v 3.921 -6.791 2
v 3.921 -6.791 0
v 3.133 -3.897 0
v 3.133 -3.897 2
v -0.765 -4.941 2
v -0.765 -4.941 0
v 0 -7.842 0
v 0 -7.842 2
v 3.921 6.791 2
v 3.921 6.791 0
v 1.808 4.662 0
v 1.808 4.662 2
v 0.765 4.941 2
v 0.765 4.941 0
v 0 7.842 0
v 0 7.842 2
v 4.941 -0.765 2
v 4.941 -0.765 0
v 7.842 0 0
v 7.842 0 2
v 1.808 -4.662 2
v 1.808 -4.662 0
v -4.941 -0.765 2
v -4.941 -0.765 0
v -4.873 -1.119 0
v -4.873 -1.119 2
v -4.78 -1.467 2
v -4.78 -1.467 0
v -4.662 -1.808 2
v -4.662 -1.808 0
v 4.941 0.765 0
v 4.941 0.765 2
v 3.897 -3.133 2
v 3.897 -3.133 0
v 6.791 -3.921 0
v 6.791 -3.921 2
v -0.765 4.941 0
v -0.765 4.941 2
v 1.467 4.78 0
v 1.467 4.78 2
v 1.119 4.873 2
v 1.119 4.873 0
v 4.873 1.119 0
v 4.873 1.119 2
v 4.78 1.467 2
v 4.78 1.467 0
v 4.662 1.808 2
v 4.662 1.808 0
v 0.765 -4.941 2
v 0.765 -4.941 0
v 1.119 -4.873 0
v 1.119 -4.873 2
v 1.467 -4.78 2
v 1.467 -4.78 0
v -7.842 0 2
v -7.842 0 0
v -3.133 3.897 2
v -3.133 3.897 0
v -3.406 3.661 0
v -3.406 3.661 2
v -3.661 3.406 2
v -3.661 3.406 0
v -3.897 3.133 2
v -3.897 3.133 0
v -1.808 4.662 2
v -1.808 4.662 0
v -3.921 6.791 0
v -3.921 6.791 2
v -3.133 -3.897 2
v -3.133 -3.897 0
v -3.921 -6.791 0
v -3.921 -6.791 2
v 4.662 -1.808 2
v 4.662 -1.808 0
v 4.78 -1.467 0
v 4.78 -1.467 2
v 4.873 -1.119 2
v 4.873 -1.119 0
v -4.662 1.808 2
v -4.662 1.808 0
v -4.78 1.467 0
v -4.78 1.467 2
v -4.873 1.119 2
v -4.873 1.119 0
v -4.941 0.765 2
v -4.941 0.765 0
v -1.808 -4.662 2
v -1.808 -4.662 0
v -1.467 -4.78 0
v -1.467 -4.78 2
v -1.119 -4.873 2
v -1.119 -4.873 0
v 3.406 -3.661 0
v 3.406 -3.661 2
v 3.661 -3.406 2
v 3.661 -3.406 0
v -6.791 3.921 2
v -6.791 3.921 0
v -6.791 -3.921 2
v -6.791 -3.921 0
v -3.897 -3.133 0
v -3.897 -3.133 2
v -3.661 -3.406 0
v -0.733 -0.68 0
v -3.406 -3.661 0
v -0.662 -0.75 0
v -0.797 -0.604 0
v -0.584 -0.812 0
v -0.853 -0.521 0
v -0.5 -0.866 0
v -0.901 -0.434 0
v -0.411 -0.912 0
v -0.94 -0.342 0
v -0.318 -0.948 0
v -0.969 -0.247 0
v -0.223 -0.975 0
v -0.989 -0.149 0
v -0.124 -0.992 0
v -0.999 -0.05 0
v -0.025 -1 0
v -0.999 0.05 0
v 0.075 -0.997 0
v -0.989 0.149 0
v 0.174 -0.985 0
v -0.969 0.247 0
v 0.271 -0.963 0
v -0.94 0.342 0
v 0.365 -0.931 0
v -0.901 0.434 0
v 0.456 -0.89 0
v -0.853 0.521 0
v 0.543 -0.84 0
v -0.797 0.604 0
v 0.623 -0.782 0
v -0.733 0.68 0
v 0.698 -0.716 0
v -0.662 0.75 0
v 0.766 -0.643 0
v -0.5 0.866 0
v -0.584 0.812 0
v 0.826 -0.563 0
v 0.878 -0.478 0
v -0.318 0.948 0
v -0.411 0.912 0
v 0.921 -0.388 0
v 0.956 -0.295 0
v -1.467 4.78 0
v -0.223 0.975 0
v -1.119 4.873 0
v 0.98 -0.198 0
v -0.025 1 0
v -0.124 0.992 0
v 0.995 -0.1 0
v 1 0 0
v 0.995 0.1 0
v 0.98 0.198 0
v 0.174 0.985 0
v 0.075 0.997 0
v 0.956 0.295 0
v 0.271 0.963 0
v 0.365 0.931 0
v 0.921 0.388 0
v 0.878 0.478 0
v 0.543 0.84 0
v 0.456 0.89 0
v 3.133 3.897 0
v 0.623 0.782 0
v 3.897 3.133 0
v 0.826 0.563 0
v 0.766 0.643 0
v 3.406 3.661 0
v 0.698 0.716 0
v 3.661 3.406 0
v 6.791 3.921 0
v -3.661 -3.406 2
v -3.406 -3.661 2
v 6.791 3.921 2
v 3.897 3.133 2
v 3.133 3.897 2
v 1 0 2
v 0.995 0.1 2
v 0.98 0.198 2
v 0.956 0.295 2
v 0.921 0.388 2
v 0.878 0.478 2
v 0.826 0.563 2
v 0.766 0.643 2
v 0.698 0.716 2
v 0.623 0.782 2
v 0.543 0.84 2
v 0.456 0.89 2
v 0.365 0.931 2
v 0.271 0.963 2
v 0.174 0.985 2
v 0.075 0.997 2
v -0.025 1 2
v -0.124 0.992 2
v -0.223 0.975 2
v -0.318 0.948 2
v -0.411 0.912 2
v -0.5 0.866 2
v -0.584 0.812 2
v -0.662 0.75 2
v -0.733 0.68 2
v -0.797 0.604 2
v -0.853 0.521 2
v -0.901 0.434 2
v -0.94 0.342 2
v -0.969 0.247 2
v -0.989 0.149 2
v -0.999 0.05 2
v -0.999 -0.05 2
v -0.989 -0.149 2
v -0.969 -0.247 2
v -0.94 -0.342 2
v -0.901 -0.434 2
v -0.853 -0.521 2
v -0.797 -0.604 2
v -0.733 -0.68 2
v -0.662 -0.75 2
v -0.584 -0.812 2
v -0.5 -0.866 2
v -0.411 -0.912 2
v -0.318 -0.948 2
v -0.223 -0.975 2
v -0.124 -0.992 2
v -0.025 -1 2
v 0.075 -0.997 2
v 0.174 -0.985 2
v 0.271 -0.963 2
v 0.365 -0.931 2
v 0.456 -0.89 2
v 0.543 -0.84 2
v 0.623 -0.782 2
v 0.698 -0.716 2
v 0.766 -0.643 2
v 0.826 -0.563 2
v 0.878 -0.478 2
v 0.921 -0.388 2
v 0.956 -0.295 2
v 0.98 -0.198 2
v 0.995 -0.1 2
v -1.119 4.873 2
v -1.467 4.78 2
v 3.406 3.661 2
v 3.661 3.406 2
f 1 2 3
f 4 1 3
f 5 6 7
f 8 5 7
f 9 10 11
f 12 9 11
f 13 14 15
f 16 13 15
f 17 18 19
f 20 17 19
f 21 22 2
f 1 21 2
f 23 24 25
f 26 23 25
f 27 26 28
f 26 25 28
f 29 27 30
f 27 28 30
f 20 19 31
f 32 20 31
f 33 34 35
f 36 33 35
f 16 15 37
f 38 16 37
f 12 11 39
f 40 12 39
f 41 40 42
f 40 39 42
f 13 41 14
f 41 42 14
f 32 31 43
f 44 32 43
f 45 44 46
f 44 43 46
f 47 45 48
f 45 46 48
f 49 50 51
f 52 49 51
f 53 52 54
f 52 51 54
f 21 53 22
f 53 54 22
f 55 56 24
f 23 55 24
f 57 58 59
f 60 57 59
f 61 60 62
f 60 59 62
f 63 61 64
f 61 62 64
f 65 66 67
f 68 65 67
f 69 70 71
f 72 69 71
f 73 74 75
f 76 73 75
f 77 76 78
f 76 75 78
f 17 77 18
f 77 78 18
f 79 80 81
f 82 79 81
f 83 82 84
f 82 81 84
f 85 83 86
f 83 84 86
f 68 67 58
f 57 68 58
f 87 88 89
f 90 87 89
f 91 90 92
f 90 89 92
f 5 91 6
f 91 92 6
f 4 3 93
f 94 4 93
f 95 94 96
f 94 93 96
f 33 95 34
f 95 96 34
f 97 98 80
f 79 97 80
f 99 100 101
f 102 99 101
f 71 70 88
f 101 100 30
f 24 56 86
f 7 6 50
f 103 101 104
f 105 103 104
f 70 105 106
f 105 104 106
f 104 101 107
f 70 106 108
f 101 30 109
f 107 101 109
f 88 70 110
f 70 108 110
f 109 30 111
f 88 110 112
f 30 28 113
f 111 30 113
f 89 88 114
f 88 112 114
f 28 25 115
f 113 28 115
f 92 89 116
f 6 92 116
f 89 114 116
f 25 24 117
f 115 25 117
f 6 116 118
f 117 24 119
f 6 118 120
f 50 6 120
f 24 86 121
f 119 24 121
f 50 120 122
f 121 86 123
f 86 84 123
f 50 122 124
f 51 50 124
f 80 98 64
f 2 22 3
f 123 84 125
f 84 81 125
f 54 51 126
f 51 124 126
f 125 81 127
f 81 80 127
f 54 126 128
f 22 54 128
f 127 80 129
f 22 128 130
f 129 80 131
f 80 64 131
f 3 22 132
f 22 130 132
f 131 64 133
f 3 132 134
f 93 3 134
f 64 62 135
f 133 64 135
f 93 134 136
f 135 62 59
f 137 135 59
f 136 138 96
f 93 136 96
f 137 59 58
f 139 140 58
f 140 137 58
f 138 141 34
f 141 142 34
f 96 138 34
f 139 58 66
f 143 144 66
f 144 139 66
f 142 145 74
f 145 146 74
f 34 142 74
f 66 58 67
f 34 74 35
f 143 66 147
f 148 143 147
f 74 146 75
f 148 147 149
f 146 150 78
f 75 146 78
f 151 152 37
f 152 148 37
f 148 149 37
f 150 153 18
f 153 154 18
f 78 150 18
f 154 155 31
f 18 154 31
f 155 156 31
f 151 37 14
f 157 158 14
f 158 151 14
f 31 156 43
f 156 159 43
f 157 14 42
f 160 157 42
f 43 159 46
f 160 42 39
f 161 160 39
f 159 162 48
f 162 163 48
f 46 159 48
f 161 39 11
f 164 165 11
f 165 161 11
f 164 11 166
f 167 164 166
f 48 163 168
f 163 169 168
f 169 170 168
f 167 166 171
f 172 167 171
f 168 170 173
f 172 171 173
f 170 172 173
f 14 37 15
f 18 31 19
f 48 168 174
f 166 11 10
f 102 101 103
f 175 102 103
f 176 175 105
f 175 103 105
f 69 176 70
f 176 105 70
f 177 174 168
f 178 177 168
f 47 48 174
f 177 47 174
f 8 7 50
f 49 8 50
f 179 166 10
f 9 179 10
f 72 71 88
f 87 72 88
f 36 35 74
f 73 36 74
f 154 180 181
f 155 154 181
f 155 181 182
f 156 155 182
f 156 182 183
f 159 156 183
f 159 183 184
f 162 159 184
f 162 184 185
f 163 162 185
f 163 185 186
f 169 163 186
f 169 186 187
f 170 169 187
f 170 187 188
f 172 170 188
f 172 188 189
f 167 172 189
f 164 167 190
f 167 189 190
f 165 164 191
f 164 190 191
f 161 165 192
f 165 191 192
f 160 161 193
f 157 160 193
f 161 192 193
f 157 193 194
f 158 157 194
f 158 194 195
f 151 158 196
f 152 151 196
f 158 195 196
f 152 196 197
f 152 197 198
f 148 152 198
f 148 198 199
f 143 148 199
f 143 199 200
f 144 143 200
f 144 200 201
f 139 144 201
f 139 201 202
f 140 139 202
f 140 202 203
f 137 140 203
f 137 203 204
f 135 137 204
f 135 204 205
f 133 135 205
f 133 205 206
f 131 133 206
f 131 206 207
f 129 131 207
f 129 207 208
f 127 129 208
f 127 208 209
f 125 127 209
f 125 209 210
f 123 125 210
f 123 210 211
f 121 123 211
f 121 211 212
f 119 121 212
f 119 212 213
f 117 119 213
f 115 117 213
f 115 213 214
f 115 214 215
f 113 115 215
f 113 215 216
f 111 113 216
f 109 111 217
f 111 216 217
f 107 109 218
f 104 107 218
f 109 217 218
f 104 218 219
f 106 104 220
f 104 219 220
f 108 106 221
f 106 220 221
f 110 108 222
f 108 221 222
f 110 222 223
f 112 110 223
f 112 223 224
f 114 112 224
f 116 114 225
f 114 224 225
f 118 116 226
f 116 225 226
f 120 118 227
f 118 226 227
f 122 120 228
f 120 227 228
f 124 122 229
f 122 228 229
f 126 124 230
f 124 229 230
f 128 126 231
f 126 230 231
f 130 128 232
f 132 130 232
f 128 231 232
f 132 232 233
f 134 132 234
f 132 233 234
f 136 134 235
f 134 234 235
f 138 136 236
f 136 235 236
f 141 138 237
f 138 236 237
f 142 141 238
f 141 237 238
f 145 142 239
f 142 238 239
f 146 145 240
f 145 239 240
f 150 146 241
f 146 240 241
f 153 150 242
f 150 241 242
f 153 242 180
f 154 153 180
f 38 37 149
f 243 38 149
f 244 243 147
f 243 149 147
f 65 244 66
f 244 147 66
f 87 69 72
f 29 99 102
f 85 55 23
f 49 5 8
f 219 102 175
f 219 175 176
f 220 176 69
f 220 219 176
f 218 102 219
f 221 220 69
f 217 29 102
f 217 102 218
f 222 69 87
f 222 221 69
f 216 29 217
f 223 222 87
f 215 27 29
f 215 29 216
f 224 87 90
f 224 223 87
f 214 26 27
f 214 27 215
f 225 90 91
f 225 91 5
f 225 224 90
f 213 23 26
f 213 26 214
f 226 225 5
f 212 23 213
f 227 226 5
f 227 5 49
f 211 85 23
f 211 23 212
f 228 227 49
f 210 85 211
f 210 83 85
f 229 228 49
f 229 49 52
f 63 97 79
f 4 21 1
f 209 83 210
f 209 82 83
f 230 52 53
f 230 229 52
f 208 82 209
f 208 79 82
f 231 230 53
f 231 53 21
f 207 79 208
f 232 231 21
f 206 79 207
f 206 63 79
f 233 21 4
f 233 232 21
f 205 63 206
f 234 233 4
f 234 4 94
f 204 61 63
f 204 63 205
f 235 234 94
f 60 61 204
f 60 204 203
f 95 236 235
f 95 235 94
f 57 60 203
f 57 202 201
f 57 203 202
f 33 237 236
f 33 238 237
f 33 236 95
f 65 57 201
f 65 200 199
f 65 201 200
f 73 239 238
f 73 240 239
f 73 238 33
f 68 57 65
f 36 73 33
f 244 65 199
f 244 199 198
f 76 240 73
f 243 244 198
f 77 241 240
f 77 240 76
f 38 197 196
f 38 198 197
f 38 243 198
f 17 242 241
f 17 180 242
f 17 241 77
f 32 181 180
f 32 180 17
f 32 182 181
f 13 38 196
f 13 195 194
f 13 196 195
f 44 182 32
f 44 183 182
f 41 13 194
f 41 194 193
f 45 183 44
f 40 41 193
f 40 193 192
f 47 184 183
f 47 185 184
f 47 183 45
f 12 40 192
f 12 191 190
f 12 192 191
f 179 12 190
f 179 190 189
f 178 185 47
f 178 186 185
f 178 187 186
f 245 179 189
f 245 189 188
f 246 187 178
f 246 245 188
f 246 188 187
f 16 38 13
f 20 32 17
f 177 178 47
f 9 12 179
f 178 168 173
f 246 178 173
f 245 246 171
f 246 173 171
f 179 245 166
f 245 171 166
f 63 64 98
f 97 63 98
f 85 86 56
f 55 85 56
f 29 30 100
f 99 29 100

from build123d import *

# Parameters (mm, degrees)
F1_DEPTH = 2
F2_R     = 1
F3_DEPTH = 25


with BuildPart() as f1:
    # F0 (on Top) → F1 (new body)
    with BuildSketch(Plane.XY):
        with BuildLine():
            ThreePointArc((4.941112, -0.76512), (4.985256, -0.383692), (5, 0))
            ThreePointArc((5, 0), (4.985256, 0.383692), (4.941112, 0.76512))
            ThreePointArc((4.941112, 0.76512), (4.829629, 1.294095), (4.661689, 1.807943))
            ThreePointArc((4.661689, 1.807943), (4.330127, 2.5), (3.896569, 3.13317))
            ThreePointArc((3.896569, 3.13317), (3.535534, 3.535534), (3.13317, 3.896569))
            ThreePointArc((3.13317, 3.896569), (2.5, 4.330127), (1.807943, 4.661689))
            ThreePointArc((1.807943, 4.661689), (1.294095, 4.829629), (0.76512, 4.941112))
            ThreePointArc((0.76512, 4.941112), (0, 5), (-0.76512, 4.941112))
            ThreePointArc((-0.76512, 4.941112), (-1.294095, 4.829629), (-1.807943, 4.661689))
            ThreePointArc((-1.807943, 4.661689), (-2.5, 4.330127), (-3.13317, 3.896569))
            ThreePointArc((-3.13317, 3.896569), (-3.535534, 3.535534), (-3.896569, 3.13317))
            ThreePointArc((-3.896569, 3.13317), (-4.330127, 2.5), (-4.661689, 1.807943))
            ThreePointArc((-4.661689, 1.807943), (-4.829629, 1.294095), (-4.941112, 0.76512))
            ThreePointArc((-4.941112, 0.76512), (-5, 0), (-4.941112, -0.76512))
            ThreePointArc((-4.941112, -0.76512), (-4.829629, -1.294095), (-4.661689, -1.807943))
            ThreePointArc((-4.661689, -1.807943), (-4.330127, -2.5), (-3.896569, -3.13317))
            ThreePointArc((-3.896569, -3.13317), (-3.535534, -3.535534), (-3.13317, -3.896569))
            ThreePointArc((-3.13317, -3.896569), (-2.5, -4.330127), (-1.807943, -4.661689))
            ThreePointArc((-1.807943, -4.661689), (-1.294095, -4.829629), (-0.76512, -4.941112))
            ThreePointArc((-0.76512, -4.941112), (0, -5), (0.76512, -4.941112))
            ThreePointArc((0.76512, -4.941112), (1.294095, -4.829629), (1.807943, -4.661689))
            ThreePointArc((1.807943, -4.661689), (2.5, -4.330127), (3.13317, -3.896569))
            ThreePointArc((3.13317, -3.896569), (3.535534, -3.535534), (3.896569, -3.13317))
            ThreePointArc((3.896569, -3.13317), (4.330127, -2.5), (4.661689, -1.807943))
            ThreePointArc((4.661689, -1.807943), (4.829629, -1.294095), (4.941112, -0.76512))
        make_face()
        with BuildLine():
            ThreePointArc((4.941112, 0.76512), (4.985256, 0.383692), (5, 0))
            ThreePointArc((5, 0), (4.985256, -0.383692), (4.941112, -0.76512))
            Line((4.941112, -0.76512), (7.841904, 0))
            Line((7.841904, 0), (4.941112, 0.76512))
        make_face()
        with BuildLine():
            ThreePointArc((3.896569, 3.13317), (4.330127, 2.5), (4.661689, 1.807943))
            Line((4.661689, 1.807943), (6.791288, 3.920952))
            Line((6.791288, 3.920952), (3.896569, 3.13317))
        make_face()
        with BuildLine():
            Line((6.791288, -3.920952), (4.661689, -1.807943))
            ThreePointArc((4.661689, -1.807943), (4.330127, -2.5), (3.896569, -3.13317))
            Line((3.896569, -3.13317), (6.791288, -3.920952))
        make_face()
        with BuildLine():
            ThreePointArc((1.807943, 4.661689), (2.5, 4.330127), (3.13317, 3.896569))
            Line((3.13317, 3.896569), (3.920952, 6.791288))
            Line((3.920952, 6.791288), (1.807943, 4.661689))
        make_face()
        with BuildLine():
            Line((3.920952, -6.791288), (3.13317, -3.896569))
            ThreePointArc((3.13317, -3.896569), (2.5, -4.330127), (1.807943, -4.661689))
            Line((1.807943, -4.661689), (3.920952, -6.791288))
        make_face()
        with BuildLine():
            ThreePointArc((-0.76512, 4.941112), (0, 5), (0.76512, 4.941112))
            Line((0.76512, 4.941112), (0, 7.841904))
            Line((0, 7.841904), (-0.76512, 4.941112))
        make_face()
        with BuildLine():
            Line((0, -7.841904), (0.76512, -4.941112))
            ThreePointArc((0.76512, -4.941112), (0, -5), (-0.76512, -4.941112))
            Line((-0.76512, -4.941112), (0, -7.841904))
        make_face()
        with BuildLine():
            ThreePointArc((-3.13317, 3.896569), (-2.5, 4.330127), (-1.807943, 4.661689))
            Line((-1.807943, 4.661689), (-3.920952, 6.791288))
            Line((-3.920952, 6.791288), (-3.13317, 3.896569))
        make_face()
        with BuildLine():
            Line((-3.920952, -6.791288), (-1.807943, -4.661689))
            ThreePointArc((-1.807943, -4.661689), (-2.5, -4.330127), (-3.13317, -3.896569))
            Line((-3.13317, -3.896569), (-3.920952, -6.791288))
        make_face()
        with BuildLine():
            ThreePointArc((-4.661689, 1.807943), (-4.330127, 2.5), (-3.896569, 3.13317))
            Line((-3.896569, 3.13317), (-6.791288, 3.920952))
            Line((-6.791288, 3.920952), (-4.661689, 1.807943))
        make_face()
        with BuildLine():
            Line((-6.791288, -3.920952), (-3.896569, -3.13317))
            ThreePointArc((-3.896569, -3.13317), (-4.330127, -2.5), (-4.661689, -1.807943))
            Line((-4.661689, -1.807943), (-6.791288, -3.920952))
        make_face()
        with BuildLine():
            ThreePointArc((-4.941112, -0.76512), (-5, 0), (-4.941112, 0.76512))
            Line((-4.941112, 0.76512), (-7.841904, 0))
            Line((-7.841904, 0), (-4.941112, -0.76512))
        make_face()
    extrude(amount=F1_DEPTH)

    # F2 (on face) → F3 (cut)
    with BuildSketch(Plane.XY.offset(2)):
        Circle(F2_R)
    extrude(amount=-F3_DEPTH, mode=Mode.SUBTRACT)


solid = f1.part
